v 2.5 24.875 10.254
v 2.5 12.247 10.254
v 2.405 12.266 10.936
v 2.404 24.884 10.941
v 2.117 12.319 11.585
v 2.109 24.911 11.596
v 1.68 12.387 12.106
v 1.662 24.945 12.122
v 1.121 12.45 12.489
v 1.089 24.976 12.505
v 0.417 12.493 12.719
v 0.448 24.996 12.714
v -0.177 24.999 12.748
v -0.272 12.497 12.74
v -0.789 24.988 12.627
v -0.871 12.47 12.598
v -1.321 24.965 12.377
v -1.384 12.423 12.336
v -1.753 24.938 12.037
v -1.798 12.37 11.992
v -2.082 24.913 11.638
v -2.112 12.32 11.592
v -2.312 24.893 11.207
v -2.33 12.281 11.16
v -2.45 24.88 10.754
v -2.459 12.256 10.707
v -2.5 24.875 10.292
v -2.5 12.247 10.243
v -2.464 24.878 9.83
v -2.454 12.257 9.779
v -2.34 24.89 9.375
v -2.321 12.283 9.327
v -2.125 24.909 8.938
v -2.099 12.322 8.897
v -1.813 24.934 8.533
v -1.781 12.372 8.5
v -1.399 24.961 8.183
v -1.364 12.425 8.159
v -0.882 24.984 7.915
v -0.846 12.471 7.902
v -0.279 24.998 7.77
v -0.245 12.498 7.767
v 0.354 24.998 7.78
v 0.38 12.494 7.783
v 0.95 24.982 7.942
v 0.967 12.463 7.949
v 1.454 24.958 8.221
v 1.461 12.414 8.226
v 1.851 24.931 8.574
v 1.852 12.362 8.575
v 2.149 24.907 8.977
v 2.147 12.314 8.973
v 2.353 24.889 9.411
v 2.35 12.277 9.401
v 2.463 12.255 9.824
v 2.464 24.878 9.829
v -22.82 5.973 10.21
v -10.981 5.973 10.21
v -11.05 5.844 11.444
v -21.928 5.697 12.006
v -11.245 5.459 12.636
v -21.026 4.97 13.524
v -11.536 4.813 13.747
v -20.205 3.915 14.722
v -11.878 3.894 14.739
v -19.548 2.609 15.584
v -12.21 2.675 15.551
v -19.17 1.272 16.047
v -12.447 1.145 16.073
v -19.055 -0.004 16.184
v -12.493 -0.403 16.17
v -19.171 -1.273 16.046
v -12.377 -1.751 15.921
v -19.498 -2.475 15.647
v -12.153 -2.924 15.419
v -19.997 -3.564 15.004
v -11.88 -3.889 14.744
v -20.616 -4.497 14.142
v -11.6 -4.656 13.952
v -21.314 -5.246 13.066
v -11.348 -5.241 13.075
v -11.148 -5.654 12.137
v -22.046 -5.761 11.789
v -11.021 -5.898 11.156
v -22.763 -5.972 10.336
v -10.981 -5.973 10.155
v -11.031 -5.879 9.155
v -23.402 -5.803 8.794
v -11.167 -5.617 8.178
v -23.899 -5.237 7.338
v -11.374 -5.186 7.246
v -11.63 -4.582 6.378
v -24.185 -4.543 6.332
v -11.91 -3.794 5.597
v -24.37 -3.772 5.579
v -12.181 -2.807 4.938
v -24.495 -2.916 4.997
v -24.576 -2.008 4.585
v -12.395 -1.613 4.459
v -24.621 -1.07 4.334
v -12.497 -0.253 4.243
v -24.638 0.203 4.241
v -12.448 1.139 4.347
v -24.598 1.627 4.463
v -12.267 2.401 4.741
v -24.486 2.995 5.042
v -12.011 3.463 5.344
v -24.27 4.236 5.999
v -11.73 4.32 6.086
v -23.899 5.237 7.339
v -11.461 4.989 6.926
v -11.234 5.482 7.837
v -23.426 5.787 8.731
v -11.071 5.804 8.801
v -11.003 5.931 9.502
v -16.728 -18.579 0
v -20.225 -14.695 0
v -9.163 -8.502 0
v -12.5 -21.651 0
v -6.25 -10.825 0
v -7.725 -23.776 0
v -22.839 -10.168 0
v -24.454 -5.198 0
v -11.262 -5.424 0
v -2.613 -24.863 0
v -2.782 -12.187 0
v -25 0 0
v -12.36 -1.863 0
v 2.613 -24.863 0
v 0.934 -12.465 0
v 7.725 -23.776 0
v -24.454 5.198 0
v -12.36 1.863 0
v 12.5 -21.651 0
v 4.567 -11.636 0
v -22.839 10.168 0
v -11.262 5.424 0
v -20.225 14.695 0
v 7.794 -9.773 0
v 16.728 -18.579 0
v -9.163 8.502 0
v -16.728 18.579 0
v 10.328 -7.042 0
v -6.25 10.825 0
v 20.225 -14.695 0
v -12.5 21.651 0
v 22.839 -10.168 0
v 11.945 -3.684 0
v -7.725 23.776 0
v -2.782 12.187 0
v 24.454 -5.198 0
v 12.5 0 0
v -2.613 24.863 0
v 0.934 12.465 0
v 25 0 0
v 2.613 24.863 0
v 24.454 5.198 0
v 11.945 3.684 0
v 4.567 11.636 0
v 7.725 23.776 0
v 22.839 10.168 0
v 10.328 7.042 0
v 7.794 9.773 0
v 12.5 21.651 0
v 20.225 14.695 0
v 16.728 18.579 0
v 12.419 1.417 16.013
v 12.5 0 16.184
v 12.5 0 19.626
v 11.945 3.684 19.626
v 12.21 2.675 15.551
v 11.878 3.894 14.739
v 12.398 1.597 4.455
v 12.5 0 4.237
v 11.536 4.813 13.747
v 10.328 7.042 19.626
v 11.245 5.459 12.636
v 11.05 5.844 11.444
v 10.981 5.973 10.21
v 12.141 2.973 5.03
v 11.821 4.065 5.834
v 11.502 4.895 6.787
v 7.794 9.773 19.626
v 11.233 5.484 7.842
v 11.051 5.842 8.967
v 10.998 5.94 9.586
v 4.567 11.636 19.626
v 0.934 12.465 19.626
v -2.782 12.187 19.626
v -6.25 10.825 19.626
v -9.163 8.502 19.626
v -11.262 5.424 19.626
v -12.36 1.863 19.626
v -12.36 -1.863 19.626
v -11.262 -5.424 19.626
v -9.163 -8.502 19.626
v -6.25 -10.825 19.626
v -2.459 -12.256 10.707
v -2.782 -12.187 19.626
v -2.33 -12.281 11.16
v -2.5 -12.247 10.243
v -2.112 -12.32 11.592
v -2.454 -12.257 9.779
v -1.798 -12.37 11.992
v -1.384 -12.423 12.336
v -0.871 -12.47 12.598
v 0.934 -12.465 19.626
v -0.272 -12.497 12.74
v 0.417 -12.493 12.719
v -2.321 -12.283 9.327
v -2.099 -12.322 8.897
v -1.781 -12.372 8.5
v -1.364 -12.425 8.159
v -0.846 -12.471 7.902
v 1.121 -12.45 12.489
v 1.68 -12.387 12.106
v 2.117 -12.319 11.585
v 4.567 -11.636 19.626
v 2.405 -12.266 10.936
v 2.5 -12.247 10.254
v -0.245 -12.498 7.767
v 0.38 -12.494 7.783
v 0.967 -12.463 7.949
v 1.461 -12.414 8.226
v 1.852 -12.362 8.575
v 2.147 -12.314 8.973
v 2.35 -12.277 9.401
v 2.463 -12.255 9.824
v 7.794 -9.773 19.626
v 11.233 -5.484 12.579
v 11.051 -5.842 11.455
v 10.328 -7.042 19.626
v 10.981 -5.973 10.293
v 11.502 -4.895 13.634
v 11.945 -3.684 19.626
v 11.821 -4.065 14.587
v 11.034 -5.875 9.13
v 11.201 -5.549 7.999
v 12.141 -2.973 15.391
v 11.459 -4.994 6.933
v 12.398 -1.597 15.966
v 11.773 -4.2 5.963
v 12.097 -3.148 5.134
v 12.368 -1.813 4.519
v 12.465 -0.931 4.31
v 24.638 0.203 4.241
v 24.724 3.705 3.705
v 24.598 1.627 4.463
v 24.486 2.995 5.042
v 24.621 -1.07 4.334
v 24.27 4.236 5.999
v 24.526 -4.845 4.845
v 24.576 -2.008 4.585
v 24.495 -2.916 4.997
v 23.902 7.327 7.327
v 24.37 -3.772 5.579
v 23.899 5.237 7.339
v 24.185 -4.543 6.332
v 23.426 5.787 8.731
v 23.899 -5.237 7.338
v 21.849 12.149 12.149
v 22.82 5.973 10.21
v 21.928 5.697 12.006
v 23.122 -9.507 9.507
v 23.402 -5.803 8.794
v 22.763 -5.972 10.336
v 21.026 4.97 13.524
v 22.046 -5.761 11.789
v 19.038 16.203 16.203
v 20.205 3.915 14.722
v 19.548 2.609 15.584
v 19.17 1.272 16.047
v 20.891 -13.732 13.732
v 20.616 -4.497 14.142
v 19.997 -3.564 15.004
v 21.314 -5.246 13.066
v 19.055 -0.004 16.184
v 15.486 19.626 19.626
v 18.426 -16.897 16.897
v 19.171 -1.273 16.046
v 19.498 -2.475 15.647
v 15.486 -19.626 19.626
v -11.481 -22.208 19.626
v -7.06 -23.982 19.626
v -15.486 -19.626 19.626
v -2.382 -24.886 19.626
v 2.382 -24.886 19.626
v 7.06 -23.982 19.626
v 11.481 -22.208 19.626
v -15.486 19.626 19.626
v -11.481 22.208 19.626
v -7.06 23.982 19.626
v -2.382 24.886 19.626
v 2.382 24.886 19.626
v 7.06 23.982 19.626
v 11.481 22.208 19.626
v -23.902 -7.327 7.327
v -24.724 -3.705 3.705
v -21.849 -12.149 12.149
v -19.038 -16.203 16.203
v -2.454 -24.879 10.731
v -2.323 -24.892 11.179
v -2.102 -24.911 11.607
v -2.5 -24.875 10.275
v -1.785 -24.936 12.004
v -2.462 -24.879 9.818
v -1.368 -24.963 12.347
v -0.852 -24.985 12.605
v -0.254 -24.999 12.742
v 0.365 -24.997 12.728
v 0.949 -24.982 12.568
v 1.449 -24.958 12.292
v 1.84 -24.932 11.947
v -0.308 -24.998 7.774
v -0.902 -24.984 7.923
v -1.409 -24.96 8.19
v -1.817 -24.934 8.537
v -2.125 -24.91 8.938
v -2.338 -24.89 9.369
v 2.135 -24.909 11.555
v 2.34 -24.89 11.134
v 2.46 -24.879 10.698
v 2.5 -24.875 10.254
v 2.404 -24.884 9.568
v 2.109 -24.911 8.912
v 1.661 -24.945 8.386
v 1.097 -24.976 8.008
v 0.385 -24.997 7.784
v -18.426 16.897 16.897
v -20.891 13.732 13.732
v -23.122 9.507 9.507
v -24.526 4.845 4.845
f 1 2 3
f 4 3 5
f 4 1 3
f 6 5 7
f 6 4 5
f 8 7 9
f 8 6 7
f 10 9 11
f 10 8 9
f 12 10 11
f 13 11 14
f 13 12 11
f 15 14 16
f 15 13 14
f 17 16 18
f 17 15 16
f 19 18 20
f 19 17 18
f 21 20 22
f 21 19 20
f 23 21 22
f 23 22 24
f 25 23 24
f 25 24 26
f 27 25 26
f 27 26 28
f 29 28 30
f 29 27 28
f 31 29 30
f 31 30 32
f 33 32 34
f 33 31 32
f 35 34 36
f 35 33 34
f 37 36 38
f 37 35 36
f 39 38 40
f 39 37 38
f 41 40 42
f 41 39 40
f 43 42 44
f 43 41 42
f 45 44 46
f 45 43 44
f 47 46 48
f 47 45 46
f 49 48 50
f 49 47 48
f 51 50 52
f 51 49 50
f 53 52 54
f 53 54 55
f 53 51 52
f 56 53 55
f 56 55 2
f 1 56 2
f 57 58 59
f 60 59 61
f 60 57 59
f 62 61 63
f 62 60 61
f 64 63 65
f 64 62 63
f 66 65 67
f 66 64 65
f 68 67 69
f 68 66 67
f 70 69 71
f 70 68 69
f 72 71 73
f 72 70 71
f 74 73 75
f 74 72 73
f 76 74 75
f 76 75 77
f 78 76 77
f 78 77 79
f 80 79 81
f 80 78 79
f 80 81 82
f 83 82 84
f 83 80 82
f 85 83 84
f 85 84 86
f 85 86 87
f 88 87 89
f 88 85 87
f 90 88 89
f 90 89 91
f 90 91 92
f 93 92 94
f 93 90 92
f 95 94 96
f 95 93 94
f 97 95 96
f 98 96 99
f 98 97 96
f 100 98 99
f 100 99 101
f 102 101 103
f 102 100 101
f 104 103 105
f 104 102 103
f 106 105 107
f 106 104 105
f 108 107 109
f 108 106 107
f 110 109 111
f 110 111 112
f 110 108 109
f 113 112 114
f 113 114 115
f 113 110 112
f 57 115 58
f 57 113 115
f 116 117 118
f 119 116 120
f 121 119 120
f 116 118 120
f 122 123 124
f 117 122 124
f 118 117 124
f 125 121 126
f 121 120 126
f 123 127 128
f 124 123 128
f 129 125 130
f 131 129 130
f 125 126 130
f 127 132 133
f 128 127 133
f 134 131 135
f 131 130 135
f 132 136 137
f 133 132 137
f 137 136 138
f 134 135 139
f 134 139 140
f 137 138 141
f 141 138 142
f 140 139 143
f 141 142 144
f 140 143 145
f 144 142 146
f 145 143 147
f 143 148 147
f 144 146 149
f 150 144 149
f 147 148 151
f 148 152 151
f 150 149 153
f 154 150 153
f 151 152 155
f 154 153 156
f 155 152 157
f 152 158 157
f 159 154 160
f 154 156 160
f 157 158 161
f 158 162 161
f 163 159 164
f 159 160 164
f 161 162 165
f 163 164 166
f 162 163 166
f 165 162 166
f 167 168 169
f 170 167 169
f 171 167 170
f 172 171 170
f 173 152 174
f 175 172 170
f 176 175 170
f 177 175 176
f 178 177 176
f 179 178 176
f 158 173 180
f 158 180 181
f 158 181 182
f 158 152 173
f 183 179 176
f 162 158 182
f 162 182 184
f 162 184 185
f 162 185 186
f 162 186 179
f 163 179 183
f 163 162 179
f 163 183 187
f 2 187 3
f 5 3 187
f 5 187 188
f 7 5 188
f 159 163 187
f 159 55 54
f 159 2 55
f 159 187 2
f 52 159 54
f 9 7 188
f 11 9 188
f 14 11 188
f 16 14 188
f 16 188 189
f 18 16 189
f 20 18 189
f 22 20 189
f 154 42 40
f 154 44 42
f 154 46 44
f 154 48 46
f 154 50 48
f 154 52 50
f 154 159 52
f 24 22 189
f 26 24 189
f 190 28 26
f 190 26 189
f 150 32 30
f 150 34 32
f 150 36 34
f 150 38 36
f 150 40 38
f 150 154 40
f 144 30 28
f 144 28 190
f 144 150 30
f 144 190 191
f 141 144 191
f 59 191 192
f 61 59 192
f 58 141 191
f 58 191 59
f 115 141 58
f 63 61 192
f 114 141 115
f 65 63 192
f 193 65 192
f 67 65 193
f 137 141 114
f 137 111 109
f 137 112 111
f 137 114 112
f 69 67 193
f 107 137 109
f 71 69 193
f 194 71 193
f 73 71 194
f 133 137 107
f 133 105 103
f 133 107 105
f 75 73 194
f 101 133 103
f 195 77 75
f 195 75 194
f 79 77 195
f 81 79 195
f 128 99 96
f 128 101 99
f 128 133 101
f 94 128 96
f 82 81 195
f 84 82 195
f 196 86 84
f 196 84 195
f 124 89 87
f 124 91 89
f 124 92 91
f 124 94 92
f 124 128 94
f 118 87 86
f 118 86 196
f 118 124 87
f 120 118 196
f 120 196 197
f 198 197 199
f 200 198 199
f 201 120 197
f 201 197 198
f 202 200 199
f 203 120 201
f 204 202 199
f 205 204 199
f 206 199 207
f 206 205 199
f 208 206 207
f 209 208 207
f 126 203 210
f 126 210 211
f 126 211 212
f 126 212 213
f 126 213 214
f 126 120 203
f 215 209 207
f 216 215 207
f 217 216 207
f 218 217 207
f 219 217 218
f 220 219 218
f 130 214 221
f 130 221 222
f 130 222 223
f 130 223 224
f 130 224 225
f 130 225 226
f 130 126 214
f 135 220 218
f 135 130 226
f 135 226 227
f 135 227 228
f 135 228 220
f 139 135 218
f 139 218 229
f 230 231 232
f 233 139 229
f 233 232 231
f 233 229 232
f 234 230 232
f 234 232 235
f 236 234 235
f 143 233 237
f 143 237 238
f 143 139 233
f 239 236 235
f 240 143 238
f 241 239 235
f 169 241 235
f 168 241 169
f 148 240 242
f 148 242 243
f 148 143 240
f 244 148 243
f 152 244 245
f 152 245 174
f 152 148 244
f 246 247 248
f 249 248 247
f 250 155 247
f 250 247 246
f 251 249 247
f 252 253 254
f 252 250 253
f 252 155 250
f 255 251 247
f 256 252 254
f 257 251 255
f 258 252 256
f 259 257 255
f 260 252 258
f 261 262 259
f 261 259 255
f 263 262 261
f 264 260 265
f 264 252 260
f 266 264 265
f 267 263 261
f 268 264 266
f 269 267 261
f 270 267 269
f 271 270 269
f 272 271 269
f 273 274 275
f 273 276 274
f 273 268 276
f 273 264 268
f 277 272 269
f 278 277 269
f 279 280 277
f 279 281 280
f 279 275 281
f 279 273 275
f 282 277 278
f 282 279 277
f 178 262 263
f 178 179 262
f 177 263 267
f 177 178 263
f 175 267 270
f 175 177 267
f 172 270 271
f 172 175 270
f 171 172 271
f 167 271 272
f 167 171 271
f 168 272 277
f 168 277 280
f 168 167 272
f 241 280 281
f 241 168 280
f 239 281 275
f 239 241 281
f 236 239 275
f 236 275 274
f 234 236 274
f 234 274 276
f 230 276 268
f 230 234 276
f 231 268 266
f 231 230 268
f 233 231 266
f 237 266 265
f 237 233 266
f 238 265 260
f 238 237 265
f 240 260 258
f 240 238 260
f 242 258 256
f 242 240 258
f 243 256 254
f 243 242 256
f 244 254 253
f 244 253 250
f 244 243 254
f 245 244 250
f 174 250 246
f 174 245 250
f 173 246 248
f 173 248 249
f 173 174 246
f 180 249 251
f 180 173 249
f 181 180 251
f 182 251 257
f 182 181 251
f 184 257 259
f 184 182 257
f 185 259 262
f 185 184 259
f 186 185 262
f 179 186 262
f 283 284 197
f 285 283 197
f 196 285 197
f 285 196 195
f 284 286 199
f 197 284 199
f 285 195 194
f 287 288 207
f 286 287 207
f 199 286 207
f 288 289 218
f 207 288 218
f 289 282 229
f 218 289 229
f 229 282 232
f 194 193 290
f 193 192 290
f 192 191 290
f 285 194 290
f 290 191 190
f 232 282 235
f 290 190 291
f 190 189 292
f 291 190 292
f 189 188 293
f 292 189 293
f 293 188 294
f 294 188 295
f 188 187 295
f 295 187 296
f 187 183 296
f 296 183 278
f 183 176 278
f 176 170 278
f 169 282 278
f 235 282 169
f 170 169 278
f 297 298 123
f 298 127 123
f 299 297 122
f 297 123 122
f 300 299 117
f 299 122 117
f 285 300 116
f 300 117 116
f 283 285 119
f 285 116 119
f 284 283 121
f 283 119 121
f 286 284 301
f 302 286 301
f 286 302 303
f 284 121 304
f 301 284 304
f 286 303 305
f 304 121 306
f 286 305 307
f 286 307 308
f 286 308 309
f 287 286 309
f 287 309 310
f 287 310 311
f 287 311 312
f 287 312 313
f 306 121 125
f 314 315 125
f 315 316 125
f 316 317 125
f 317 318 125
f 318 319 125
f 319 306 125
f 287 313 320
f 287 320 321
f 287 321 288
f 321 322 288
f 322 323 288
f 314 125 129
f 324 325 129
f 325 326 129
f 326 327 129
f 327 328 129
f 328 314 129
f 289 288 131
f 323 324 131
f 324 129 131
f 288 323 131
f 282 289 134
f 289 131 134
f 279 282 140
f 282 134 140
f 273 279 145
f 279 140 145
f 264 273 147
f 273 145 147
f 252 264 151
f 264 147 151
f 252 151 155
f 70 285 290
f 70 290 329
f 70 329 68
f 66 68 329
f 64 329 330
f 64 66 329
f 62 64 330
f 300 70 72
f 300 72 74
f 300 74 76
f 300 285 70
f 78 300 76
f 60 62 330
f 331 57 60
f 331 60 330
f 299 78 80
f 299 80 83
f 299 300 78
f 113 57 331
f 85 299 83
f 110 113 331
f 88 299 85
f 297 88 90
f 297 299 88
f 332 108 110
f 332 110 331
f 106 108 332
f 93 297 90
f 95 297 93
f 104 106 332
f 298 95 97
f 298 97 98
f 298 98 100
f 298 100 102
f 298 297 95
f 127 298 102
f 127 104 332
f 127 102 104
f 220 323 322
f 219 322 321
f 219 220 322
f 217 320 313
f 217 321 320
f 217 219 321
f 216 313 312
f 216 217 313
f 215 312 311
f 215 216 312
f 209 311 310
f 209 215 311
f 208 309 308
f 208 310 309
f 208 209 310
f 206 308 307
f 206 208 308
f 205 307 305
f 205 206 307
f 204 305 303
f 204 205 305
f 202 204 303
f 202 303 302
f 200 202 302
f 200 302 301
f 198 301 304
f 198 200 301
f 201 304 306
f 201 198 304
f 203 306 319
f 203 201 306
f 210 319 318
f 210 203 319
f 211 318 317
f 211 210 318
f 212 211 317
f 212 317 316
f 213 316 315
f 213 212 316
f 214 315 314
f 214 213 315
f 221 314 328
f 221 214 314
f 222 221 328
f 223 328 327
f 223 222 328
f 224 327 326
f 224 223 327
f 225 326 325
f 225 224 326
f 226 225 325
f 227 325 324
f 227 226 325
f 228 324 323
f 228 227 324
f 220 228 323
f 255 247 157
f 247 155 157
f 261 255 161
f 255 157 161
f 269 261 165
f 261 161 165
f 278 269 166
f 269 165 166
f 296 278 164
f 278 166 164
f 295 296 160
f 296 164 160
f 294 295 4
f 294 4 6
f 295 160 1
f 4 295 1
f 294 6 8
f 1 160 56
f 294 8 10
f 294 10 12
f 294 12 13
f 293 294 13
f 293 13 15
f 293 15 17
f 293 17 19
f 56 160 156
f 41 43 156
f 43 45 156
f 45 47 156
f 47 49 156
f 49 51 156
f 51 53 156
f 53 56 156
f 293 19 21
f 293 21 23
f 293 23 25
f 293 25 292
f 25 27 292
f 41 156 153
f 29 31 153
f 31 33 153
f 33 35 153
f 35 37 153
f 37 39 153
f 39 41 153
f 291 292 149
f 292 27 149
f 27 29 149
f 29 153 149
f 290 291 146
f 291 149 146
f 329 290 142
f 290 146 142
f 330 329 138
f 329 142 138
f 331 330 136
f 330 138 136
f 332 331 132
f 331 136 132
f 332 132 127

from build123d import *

# Parameters (mm, degrees)
F0_R     = 25
F0_R_2   = 12.5
F3_DEPTH = 50
F1_W     = 50
F1_H     = 19.626164
F1_R     = 5.973153
F4_DEPTH = 25
F2_R     = 25
F2_R_2   = 2.5
F5_DEPTH = 25


with BuildPart() as f3:
    # F0 (on Top) → F3 (new body)
    with BuildSketch(Plane.XY):
        Circle(F0_R)
        Circle(F0_R_2, mode=Mode.SUBTRACT)
    extrude(amount=F3_DEPTH)


with BuildPart() as f4:
    # F1 (on Right) → F4 (new body, symmetric)
    with BuildSketch(Plane.YZ):
        with Locations((0, 9.813082)):
            Rectangle(F1_W, F1_H)
        with Locations((0, 10.210484)):
            Circle(F1_R, mode=Mode.SUBTRACT)
    extrude(amount=F4_DEPTH, both=True)


with BuildPart() as f5:
    # F2 (on Front) → F5 (new body, symmetric)
    with BuildSketch(Plane.XZ):
        Circle(F2_R)
        with Locations((0, 10.25444)):
            Circle(F2_R_2, mode=Mode.SUBTRACT)
    extrude(amount=F5_DEPTH, both=True)


with BuildPart() as f3_1:
    add(f3.part)

    # F6: intersect F4, F5
    add(f4.part, mode=Mode.INTERSECT)
    add(f5.part, mode=Mode.INTERSECT)


solid = f3_1.part
